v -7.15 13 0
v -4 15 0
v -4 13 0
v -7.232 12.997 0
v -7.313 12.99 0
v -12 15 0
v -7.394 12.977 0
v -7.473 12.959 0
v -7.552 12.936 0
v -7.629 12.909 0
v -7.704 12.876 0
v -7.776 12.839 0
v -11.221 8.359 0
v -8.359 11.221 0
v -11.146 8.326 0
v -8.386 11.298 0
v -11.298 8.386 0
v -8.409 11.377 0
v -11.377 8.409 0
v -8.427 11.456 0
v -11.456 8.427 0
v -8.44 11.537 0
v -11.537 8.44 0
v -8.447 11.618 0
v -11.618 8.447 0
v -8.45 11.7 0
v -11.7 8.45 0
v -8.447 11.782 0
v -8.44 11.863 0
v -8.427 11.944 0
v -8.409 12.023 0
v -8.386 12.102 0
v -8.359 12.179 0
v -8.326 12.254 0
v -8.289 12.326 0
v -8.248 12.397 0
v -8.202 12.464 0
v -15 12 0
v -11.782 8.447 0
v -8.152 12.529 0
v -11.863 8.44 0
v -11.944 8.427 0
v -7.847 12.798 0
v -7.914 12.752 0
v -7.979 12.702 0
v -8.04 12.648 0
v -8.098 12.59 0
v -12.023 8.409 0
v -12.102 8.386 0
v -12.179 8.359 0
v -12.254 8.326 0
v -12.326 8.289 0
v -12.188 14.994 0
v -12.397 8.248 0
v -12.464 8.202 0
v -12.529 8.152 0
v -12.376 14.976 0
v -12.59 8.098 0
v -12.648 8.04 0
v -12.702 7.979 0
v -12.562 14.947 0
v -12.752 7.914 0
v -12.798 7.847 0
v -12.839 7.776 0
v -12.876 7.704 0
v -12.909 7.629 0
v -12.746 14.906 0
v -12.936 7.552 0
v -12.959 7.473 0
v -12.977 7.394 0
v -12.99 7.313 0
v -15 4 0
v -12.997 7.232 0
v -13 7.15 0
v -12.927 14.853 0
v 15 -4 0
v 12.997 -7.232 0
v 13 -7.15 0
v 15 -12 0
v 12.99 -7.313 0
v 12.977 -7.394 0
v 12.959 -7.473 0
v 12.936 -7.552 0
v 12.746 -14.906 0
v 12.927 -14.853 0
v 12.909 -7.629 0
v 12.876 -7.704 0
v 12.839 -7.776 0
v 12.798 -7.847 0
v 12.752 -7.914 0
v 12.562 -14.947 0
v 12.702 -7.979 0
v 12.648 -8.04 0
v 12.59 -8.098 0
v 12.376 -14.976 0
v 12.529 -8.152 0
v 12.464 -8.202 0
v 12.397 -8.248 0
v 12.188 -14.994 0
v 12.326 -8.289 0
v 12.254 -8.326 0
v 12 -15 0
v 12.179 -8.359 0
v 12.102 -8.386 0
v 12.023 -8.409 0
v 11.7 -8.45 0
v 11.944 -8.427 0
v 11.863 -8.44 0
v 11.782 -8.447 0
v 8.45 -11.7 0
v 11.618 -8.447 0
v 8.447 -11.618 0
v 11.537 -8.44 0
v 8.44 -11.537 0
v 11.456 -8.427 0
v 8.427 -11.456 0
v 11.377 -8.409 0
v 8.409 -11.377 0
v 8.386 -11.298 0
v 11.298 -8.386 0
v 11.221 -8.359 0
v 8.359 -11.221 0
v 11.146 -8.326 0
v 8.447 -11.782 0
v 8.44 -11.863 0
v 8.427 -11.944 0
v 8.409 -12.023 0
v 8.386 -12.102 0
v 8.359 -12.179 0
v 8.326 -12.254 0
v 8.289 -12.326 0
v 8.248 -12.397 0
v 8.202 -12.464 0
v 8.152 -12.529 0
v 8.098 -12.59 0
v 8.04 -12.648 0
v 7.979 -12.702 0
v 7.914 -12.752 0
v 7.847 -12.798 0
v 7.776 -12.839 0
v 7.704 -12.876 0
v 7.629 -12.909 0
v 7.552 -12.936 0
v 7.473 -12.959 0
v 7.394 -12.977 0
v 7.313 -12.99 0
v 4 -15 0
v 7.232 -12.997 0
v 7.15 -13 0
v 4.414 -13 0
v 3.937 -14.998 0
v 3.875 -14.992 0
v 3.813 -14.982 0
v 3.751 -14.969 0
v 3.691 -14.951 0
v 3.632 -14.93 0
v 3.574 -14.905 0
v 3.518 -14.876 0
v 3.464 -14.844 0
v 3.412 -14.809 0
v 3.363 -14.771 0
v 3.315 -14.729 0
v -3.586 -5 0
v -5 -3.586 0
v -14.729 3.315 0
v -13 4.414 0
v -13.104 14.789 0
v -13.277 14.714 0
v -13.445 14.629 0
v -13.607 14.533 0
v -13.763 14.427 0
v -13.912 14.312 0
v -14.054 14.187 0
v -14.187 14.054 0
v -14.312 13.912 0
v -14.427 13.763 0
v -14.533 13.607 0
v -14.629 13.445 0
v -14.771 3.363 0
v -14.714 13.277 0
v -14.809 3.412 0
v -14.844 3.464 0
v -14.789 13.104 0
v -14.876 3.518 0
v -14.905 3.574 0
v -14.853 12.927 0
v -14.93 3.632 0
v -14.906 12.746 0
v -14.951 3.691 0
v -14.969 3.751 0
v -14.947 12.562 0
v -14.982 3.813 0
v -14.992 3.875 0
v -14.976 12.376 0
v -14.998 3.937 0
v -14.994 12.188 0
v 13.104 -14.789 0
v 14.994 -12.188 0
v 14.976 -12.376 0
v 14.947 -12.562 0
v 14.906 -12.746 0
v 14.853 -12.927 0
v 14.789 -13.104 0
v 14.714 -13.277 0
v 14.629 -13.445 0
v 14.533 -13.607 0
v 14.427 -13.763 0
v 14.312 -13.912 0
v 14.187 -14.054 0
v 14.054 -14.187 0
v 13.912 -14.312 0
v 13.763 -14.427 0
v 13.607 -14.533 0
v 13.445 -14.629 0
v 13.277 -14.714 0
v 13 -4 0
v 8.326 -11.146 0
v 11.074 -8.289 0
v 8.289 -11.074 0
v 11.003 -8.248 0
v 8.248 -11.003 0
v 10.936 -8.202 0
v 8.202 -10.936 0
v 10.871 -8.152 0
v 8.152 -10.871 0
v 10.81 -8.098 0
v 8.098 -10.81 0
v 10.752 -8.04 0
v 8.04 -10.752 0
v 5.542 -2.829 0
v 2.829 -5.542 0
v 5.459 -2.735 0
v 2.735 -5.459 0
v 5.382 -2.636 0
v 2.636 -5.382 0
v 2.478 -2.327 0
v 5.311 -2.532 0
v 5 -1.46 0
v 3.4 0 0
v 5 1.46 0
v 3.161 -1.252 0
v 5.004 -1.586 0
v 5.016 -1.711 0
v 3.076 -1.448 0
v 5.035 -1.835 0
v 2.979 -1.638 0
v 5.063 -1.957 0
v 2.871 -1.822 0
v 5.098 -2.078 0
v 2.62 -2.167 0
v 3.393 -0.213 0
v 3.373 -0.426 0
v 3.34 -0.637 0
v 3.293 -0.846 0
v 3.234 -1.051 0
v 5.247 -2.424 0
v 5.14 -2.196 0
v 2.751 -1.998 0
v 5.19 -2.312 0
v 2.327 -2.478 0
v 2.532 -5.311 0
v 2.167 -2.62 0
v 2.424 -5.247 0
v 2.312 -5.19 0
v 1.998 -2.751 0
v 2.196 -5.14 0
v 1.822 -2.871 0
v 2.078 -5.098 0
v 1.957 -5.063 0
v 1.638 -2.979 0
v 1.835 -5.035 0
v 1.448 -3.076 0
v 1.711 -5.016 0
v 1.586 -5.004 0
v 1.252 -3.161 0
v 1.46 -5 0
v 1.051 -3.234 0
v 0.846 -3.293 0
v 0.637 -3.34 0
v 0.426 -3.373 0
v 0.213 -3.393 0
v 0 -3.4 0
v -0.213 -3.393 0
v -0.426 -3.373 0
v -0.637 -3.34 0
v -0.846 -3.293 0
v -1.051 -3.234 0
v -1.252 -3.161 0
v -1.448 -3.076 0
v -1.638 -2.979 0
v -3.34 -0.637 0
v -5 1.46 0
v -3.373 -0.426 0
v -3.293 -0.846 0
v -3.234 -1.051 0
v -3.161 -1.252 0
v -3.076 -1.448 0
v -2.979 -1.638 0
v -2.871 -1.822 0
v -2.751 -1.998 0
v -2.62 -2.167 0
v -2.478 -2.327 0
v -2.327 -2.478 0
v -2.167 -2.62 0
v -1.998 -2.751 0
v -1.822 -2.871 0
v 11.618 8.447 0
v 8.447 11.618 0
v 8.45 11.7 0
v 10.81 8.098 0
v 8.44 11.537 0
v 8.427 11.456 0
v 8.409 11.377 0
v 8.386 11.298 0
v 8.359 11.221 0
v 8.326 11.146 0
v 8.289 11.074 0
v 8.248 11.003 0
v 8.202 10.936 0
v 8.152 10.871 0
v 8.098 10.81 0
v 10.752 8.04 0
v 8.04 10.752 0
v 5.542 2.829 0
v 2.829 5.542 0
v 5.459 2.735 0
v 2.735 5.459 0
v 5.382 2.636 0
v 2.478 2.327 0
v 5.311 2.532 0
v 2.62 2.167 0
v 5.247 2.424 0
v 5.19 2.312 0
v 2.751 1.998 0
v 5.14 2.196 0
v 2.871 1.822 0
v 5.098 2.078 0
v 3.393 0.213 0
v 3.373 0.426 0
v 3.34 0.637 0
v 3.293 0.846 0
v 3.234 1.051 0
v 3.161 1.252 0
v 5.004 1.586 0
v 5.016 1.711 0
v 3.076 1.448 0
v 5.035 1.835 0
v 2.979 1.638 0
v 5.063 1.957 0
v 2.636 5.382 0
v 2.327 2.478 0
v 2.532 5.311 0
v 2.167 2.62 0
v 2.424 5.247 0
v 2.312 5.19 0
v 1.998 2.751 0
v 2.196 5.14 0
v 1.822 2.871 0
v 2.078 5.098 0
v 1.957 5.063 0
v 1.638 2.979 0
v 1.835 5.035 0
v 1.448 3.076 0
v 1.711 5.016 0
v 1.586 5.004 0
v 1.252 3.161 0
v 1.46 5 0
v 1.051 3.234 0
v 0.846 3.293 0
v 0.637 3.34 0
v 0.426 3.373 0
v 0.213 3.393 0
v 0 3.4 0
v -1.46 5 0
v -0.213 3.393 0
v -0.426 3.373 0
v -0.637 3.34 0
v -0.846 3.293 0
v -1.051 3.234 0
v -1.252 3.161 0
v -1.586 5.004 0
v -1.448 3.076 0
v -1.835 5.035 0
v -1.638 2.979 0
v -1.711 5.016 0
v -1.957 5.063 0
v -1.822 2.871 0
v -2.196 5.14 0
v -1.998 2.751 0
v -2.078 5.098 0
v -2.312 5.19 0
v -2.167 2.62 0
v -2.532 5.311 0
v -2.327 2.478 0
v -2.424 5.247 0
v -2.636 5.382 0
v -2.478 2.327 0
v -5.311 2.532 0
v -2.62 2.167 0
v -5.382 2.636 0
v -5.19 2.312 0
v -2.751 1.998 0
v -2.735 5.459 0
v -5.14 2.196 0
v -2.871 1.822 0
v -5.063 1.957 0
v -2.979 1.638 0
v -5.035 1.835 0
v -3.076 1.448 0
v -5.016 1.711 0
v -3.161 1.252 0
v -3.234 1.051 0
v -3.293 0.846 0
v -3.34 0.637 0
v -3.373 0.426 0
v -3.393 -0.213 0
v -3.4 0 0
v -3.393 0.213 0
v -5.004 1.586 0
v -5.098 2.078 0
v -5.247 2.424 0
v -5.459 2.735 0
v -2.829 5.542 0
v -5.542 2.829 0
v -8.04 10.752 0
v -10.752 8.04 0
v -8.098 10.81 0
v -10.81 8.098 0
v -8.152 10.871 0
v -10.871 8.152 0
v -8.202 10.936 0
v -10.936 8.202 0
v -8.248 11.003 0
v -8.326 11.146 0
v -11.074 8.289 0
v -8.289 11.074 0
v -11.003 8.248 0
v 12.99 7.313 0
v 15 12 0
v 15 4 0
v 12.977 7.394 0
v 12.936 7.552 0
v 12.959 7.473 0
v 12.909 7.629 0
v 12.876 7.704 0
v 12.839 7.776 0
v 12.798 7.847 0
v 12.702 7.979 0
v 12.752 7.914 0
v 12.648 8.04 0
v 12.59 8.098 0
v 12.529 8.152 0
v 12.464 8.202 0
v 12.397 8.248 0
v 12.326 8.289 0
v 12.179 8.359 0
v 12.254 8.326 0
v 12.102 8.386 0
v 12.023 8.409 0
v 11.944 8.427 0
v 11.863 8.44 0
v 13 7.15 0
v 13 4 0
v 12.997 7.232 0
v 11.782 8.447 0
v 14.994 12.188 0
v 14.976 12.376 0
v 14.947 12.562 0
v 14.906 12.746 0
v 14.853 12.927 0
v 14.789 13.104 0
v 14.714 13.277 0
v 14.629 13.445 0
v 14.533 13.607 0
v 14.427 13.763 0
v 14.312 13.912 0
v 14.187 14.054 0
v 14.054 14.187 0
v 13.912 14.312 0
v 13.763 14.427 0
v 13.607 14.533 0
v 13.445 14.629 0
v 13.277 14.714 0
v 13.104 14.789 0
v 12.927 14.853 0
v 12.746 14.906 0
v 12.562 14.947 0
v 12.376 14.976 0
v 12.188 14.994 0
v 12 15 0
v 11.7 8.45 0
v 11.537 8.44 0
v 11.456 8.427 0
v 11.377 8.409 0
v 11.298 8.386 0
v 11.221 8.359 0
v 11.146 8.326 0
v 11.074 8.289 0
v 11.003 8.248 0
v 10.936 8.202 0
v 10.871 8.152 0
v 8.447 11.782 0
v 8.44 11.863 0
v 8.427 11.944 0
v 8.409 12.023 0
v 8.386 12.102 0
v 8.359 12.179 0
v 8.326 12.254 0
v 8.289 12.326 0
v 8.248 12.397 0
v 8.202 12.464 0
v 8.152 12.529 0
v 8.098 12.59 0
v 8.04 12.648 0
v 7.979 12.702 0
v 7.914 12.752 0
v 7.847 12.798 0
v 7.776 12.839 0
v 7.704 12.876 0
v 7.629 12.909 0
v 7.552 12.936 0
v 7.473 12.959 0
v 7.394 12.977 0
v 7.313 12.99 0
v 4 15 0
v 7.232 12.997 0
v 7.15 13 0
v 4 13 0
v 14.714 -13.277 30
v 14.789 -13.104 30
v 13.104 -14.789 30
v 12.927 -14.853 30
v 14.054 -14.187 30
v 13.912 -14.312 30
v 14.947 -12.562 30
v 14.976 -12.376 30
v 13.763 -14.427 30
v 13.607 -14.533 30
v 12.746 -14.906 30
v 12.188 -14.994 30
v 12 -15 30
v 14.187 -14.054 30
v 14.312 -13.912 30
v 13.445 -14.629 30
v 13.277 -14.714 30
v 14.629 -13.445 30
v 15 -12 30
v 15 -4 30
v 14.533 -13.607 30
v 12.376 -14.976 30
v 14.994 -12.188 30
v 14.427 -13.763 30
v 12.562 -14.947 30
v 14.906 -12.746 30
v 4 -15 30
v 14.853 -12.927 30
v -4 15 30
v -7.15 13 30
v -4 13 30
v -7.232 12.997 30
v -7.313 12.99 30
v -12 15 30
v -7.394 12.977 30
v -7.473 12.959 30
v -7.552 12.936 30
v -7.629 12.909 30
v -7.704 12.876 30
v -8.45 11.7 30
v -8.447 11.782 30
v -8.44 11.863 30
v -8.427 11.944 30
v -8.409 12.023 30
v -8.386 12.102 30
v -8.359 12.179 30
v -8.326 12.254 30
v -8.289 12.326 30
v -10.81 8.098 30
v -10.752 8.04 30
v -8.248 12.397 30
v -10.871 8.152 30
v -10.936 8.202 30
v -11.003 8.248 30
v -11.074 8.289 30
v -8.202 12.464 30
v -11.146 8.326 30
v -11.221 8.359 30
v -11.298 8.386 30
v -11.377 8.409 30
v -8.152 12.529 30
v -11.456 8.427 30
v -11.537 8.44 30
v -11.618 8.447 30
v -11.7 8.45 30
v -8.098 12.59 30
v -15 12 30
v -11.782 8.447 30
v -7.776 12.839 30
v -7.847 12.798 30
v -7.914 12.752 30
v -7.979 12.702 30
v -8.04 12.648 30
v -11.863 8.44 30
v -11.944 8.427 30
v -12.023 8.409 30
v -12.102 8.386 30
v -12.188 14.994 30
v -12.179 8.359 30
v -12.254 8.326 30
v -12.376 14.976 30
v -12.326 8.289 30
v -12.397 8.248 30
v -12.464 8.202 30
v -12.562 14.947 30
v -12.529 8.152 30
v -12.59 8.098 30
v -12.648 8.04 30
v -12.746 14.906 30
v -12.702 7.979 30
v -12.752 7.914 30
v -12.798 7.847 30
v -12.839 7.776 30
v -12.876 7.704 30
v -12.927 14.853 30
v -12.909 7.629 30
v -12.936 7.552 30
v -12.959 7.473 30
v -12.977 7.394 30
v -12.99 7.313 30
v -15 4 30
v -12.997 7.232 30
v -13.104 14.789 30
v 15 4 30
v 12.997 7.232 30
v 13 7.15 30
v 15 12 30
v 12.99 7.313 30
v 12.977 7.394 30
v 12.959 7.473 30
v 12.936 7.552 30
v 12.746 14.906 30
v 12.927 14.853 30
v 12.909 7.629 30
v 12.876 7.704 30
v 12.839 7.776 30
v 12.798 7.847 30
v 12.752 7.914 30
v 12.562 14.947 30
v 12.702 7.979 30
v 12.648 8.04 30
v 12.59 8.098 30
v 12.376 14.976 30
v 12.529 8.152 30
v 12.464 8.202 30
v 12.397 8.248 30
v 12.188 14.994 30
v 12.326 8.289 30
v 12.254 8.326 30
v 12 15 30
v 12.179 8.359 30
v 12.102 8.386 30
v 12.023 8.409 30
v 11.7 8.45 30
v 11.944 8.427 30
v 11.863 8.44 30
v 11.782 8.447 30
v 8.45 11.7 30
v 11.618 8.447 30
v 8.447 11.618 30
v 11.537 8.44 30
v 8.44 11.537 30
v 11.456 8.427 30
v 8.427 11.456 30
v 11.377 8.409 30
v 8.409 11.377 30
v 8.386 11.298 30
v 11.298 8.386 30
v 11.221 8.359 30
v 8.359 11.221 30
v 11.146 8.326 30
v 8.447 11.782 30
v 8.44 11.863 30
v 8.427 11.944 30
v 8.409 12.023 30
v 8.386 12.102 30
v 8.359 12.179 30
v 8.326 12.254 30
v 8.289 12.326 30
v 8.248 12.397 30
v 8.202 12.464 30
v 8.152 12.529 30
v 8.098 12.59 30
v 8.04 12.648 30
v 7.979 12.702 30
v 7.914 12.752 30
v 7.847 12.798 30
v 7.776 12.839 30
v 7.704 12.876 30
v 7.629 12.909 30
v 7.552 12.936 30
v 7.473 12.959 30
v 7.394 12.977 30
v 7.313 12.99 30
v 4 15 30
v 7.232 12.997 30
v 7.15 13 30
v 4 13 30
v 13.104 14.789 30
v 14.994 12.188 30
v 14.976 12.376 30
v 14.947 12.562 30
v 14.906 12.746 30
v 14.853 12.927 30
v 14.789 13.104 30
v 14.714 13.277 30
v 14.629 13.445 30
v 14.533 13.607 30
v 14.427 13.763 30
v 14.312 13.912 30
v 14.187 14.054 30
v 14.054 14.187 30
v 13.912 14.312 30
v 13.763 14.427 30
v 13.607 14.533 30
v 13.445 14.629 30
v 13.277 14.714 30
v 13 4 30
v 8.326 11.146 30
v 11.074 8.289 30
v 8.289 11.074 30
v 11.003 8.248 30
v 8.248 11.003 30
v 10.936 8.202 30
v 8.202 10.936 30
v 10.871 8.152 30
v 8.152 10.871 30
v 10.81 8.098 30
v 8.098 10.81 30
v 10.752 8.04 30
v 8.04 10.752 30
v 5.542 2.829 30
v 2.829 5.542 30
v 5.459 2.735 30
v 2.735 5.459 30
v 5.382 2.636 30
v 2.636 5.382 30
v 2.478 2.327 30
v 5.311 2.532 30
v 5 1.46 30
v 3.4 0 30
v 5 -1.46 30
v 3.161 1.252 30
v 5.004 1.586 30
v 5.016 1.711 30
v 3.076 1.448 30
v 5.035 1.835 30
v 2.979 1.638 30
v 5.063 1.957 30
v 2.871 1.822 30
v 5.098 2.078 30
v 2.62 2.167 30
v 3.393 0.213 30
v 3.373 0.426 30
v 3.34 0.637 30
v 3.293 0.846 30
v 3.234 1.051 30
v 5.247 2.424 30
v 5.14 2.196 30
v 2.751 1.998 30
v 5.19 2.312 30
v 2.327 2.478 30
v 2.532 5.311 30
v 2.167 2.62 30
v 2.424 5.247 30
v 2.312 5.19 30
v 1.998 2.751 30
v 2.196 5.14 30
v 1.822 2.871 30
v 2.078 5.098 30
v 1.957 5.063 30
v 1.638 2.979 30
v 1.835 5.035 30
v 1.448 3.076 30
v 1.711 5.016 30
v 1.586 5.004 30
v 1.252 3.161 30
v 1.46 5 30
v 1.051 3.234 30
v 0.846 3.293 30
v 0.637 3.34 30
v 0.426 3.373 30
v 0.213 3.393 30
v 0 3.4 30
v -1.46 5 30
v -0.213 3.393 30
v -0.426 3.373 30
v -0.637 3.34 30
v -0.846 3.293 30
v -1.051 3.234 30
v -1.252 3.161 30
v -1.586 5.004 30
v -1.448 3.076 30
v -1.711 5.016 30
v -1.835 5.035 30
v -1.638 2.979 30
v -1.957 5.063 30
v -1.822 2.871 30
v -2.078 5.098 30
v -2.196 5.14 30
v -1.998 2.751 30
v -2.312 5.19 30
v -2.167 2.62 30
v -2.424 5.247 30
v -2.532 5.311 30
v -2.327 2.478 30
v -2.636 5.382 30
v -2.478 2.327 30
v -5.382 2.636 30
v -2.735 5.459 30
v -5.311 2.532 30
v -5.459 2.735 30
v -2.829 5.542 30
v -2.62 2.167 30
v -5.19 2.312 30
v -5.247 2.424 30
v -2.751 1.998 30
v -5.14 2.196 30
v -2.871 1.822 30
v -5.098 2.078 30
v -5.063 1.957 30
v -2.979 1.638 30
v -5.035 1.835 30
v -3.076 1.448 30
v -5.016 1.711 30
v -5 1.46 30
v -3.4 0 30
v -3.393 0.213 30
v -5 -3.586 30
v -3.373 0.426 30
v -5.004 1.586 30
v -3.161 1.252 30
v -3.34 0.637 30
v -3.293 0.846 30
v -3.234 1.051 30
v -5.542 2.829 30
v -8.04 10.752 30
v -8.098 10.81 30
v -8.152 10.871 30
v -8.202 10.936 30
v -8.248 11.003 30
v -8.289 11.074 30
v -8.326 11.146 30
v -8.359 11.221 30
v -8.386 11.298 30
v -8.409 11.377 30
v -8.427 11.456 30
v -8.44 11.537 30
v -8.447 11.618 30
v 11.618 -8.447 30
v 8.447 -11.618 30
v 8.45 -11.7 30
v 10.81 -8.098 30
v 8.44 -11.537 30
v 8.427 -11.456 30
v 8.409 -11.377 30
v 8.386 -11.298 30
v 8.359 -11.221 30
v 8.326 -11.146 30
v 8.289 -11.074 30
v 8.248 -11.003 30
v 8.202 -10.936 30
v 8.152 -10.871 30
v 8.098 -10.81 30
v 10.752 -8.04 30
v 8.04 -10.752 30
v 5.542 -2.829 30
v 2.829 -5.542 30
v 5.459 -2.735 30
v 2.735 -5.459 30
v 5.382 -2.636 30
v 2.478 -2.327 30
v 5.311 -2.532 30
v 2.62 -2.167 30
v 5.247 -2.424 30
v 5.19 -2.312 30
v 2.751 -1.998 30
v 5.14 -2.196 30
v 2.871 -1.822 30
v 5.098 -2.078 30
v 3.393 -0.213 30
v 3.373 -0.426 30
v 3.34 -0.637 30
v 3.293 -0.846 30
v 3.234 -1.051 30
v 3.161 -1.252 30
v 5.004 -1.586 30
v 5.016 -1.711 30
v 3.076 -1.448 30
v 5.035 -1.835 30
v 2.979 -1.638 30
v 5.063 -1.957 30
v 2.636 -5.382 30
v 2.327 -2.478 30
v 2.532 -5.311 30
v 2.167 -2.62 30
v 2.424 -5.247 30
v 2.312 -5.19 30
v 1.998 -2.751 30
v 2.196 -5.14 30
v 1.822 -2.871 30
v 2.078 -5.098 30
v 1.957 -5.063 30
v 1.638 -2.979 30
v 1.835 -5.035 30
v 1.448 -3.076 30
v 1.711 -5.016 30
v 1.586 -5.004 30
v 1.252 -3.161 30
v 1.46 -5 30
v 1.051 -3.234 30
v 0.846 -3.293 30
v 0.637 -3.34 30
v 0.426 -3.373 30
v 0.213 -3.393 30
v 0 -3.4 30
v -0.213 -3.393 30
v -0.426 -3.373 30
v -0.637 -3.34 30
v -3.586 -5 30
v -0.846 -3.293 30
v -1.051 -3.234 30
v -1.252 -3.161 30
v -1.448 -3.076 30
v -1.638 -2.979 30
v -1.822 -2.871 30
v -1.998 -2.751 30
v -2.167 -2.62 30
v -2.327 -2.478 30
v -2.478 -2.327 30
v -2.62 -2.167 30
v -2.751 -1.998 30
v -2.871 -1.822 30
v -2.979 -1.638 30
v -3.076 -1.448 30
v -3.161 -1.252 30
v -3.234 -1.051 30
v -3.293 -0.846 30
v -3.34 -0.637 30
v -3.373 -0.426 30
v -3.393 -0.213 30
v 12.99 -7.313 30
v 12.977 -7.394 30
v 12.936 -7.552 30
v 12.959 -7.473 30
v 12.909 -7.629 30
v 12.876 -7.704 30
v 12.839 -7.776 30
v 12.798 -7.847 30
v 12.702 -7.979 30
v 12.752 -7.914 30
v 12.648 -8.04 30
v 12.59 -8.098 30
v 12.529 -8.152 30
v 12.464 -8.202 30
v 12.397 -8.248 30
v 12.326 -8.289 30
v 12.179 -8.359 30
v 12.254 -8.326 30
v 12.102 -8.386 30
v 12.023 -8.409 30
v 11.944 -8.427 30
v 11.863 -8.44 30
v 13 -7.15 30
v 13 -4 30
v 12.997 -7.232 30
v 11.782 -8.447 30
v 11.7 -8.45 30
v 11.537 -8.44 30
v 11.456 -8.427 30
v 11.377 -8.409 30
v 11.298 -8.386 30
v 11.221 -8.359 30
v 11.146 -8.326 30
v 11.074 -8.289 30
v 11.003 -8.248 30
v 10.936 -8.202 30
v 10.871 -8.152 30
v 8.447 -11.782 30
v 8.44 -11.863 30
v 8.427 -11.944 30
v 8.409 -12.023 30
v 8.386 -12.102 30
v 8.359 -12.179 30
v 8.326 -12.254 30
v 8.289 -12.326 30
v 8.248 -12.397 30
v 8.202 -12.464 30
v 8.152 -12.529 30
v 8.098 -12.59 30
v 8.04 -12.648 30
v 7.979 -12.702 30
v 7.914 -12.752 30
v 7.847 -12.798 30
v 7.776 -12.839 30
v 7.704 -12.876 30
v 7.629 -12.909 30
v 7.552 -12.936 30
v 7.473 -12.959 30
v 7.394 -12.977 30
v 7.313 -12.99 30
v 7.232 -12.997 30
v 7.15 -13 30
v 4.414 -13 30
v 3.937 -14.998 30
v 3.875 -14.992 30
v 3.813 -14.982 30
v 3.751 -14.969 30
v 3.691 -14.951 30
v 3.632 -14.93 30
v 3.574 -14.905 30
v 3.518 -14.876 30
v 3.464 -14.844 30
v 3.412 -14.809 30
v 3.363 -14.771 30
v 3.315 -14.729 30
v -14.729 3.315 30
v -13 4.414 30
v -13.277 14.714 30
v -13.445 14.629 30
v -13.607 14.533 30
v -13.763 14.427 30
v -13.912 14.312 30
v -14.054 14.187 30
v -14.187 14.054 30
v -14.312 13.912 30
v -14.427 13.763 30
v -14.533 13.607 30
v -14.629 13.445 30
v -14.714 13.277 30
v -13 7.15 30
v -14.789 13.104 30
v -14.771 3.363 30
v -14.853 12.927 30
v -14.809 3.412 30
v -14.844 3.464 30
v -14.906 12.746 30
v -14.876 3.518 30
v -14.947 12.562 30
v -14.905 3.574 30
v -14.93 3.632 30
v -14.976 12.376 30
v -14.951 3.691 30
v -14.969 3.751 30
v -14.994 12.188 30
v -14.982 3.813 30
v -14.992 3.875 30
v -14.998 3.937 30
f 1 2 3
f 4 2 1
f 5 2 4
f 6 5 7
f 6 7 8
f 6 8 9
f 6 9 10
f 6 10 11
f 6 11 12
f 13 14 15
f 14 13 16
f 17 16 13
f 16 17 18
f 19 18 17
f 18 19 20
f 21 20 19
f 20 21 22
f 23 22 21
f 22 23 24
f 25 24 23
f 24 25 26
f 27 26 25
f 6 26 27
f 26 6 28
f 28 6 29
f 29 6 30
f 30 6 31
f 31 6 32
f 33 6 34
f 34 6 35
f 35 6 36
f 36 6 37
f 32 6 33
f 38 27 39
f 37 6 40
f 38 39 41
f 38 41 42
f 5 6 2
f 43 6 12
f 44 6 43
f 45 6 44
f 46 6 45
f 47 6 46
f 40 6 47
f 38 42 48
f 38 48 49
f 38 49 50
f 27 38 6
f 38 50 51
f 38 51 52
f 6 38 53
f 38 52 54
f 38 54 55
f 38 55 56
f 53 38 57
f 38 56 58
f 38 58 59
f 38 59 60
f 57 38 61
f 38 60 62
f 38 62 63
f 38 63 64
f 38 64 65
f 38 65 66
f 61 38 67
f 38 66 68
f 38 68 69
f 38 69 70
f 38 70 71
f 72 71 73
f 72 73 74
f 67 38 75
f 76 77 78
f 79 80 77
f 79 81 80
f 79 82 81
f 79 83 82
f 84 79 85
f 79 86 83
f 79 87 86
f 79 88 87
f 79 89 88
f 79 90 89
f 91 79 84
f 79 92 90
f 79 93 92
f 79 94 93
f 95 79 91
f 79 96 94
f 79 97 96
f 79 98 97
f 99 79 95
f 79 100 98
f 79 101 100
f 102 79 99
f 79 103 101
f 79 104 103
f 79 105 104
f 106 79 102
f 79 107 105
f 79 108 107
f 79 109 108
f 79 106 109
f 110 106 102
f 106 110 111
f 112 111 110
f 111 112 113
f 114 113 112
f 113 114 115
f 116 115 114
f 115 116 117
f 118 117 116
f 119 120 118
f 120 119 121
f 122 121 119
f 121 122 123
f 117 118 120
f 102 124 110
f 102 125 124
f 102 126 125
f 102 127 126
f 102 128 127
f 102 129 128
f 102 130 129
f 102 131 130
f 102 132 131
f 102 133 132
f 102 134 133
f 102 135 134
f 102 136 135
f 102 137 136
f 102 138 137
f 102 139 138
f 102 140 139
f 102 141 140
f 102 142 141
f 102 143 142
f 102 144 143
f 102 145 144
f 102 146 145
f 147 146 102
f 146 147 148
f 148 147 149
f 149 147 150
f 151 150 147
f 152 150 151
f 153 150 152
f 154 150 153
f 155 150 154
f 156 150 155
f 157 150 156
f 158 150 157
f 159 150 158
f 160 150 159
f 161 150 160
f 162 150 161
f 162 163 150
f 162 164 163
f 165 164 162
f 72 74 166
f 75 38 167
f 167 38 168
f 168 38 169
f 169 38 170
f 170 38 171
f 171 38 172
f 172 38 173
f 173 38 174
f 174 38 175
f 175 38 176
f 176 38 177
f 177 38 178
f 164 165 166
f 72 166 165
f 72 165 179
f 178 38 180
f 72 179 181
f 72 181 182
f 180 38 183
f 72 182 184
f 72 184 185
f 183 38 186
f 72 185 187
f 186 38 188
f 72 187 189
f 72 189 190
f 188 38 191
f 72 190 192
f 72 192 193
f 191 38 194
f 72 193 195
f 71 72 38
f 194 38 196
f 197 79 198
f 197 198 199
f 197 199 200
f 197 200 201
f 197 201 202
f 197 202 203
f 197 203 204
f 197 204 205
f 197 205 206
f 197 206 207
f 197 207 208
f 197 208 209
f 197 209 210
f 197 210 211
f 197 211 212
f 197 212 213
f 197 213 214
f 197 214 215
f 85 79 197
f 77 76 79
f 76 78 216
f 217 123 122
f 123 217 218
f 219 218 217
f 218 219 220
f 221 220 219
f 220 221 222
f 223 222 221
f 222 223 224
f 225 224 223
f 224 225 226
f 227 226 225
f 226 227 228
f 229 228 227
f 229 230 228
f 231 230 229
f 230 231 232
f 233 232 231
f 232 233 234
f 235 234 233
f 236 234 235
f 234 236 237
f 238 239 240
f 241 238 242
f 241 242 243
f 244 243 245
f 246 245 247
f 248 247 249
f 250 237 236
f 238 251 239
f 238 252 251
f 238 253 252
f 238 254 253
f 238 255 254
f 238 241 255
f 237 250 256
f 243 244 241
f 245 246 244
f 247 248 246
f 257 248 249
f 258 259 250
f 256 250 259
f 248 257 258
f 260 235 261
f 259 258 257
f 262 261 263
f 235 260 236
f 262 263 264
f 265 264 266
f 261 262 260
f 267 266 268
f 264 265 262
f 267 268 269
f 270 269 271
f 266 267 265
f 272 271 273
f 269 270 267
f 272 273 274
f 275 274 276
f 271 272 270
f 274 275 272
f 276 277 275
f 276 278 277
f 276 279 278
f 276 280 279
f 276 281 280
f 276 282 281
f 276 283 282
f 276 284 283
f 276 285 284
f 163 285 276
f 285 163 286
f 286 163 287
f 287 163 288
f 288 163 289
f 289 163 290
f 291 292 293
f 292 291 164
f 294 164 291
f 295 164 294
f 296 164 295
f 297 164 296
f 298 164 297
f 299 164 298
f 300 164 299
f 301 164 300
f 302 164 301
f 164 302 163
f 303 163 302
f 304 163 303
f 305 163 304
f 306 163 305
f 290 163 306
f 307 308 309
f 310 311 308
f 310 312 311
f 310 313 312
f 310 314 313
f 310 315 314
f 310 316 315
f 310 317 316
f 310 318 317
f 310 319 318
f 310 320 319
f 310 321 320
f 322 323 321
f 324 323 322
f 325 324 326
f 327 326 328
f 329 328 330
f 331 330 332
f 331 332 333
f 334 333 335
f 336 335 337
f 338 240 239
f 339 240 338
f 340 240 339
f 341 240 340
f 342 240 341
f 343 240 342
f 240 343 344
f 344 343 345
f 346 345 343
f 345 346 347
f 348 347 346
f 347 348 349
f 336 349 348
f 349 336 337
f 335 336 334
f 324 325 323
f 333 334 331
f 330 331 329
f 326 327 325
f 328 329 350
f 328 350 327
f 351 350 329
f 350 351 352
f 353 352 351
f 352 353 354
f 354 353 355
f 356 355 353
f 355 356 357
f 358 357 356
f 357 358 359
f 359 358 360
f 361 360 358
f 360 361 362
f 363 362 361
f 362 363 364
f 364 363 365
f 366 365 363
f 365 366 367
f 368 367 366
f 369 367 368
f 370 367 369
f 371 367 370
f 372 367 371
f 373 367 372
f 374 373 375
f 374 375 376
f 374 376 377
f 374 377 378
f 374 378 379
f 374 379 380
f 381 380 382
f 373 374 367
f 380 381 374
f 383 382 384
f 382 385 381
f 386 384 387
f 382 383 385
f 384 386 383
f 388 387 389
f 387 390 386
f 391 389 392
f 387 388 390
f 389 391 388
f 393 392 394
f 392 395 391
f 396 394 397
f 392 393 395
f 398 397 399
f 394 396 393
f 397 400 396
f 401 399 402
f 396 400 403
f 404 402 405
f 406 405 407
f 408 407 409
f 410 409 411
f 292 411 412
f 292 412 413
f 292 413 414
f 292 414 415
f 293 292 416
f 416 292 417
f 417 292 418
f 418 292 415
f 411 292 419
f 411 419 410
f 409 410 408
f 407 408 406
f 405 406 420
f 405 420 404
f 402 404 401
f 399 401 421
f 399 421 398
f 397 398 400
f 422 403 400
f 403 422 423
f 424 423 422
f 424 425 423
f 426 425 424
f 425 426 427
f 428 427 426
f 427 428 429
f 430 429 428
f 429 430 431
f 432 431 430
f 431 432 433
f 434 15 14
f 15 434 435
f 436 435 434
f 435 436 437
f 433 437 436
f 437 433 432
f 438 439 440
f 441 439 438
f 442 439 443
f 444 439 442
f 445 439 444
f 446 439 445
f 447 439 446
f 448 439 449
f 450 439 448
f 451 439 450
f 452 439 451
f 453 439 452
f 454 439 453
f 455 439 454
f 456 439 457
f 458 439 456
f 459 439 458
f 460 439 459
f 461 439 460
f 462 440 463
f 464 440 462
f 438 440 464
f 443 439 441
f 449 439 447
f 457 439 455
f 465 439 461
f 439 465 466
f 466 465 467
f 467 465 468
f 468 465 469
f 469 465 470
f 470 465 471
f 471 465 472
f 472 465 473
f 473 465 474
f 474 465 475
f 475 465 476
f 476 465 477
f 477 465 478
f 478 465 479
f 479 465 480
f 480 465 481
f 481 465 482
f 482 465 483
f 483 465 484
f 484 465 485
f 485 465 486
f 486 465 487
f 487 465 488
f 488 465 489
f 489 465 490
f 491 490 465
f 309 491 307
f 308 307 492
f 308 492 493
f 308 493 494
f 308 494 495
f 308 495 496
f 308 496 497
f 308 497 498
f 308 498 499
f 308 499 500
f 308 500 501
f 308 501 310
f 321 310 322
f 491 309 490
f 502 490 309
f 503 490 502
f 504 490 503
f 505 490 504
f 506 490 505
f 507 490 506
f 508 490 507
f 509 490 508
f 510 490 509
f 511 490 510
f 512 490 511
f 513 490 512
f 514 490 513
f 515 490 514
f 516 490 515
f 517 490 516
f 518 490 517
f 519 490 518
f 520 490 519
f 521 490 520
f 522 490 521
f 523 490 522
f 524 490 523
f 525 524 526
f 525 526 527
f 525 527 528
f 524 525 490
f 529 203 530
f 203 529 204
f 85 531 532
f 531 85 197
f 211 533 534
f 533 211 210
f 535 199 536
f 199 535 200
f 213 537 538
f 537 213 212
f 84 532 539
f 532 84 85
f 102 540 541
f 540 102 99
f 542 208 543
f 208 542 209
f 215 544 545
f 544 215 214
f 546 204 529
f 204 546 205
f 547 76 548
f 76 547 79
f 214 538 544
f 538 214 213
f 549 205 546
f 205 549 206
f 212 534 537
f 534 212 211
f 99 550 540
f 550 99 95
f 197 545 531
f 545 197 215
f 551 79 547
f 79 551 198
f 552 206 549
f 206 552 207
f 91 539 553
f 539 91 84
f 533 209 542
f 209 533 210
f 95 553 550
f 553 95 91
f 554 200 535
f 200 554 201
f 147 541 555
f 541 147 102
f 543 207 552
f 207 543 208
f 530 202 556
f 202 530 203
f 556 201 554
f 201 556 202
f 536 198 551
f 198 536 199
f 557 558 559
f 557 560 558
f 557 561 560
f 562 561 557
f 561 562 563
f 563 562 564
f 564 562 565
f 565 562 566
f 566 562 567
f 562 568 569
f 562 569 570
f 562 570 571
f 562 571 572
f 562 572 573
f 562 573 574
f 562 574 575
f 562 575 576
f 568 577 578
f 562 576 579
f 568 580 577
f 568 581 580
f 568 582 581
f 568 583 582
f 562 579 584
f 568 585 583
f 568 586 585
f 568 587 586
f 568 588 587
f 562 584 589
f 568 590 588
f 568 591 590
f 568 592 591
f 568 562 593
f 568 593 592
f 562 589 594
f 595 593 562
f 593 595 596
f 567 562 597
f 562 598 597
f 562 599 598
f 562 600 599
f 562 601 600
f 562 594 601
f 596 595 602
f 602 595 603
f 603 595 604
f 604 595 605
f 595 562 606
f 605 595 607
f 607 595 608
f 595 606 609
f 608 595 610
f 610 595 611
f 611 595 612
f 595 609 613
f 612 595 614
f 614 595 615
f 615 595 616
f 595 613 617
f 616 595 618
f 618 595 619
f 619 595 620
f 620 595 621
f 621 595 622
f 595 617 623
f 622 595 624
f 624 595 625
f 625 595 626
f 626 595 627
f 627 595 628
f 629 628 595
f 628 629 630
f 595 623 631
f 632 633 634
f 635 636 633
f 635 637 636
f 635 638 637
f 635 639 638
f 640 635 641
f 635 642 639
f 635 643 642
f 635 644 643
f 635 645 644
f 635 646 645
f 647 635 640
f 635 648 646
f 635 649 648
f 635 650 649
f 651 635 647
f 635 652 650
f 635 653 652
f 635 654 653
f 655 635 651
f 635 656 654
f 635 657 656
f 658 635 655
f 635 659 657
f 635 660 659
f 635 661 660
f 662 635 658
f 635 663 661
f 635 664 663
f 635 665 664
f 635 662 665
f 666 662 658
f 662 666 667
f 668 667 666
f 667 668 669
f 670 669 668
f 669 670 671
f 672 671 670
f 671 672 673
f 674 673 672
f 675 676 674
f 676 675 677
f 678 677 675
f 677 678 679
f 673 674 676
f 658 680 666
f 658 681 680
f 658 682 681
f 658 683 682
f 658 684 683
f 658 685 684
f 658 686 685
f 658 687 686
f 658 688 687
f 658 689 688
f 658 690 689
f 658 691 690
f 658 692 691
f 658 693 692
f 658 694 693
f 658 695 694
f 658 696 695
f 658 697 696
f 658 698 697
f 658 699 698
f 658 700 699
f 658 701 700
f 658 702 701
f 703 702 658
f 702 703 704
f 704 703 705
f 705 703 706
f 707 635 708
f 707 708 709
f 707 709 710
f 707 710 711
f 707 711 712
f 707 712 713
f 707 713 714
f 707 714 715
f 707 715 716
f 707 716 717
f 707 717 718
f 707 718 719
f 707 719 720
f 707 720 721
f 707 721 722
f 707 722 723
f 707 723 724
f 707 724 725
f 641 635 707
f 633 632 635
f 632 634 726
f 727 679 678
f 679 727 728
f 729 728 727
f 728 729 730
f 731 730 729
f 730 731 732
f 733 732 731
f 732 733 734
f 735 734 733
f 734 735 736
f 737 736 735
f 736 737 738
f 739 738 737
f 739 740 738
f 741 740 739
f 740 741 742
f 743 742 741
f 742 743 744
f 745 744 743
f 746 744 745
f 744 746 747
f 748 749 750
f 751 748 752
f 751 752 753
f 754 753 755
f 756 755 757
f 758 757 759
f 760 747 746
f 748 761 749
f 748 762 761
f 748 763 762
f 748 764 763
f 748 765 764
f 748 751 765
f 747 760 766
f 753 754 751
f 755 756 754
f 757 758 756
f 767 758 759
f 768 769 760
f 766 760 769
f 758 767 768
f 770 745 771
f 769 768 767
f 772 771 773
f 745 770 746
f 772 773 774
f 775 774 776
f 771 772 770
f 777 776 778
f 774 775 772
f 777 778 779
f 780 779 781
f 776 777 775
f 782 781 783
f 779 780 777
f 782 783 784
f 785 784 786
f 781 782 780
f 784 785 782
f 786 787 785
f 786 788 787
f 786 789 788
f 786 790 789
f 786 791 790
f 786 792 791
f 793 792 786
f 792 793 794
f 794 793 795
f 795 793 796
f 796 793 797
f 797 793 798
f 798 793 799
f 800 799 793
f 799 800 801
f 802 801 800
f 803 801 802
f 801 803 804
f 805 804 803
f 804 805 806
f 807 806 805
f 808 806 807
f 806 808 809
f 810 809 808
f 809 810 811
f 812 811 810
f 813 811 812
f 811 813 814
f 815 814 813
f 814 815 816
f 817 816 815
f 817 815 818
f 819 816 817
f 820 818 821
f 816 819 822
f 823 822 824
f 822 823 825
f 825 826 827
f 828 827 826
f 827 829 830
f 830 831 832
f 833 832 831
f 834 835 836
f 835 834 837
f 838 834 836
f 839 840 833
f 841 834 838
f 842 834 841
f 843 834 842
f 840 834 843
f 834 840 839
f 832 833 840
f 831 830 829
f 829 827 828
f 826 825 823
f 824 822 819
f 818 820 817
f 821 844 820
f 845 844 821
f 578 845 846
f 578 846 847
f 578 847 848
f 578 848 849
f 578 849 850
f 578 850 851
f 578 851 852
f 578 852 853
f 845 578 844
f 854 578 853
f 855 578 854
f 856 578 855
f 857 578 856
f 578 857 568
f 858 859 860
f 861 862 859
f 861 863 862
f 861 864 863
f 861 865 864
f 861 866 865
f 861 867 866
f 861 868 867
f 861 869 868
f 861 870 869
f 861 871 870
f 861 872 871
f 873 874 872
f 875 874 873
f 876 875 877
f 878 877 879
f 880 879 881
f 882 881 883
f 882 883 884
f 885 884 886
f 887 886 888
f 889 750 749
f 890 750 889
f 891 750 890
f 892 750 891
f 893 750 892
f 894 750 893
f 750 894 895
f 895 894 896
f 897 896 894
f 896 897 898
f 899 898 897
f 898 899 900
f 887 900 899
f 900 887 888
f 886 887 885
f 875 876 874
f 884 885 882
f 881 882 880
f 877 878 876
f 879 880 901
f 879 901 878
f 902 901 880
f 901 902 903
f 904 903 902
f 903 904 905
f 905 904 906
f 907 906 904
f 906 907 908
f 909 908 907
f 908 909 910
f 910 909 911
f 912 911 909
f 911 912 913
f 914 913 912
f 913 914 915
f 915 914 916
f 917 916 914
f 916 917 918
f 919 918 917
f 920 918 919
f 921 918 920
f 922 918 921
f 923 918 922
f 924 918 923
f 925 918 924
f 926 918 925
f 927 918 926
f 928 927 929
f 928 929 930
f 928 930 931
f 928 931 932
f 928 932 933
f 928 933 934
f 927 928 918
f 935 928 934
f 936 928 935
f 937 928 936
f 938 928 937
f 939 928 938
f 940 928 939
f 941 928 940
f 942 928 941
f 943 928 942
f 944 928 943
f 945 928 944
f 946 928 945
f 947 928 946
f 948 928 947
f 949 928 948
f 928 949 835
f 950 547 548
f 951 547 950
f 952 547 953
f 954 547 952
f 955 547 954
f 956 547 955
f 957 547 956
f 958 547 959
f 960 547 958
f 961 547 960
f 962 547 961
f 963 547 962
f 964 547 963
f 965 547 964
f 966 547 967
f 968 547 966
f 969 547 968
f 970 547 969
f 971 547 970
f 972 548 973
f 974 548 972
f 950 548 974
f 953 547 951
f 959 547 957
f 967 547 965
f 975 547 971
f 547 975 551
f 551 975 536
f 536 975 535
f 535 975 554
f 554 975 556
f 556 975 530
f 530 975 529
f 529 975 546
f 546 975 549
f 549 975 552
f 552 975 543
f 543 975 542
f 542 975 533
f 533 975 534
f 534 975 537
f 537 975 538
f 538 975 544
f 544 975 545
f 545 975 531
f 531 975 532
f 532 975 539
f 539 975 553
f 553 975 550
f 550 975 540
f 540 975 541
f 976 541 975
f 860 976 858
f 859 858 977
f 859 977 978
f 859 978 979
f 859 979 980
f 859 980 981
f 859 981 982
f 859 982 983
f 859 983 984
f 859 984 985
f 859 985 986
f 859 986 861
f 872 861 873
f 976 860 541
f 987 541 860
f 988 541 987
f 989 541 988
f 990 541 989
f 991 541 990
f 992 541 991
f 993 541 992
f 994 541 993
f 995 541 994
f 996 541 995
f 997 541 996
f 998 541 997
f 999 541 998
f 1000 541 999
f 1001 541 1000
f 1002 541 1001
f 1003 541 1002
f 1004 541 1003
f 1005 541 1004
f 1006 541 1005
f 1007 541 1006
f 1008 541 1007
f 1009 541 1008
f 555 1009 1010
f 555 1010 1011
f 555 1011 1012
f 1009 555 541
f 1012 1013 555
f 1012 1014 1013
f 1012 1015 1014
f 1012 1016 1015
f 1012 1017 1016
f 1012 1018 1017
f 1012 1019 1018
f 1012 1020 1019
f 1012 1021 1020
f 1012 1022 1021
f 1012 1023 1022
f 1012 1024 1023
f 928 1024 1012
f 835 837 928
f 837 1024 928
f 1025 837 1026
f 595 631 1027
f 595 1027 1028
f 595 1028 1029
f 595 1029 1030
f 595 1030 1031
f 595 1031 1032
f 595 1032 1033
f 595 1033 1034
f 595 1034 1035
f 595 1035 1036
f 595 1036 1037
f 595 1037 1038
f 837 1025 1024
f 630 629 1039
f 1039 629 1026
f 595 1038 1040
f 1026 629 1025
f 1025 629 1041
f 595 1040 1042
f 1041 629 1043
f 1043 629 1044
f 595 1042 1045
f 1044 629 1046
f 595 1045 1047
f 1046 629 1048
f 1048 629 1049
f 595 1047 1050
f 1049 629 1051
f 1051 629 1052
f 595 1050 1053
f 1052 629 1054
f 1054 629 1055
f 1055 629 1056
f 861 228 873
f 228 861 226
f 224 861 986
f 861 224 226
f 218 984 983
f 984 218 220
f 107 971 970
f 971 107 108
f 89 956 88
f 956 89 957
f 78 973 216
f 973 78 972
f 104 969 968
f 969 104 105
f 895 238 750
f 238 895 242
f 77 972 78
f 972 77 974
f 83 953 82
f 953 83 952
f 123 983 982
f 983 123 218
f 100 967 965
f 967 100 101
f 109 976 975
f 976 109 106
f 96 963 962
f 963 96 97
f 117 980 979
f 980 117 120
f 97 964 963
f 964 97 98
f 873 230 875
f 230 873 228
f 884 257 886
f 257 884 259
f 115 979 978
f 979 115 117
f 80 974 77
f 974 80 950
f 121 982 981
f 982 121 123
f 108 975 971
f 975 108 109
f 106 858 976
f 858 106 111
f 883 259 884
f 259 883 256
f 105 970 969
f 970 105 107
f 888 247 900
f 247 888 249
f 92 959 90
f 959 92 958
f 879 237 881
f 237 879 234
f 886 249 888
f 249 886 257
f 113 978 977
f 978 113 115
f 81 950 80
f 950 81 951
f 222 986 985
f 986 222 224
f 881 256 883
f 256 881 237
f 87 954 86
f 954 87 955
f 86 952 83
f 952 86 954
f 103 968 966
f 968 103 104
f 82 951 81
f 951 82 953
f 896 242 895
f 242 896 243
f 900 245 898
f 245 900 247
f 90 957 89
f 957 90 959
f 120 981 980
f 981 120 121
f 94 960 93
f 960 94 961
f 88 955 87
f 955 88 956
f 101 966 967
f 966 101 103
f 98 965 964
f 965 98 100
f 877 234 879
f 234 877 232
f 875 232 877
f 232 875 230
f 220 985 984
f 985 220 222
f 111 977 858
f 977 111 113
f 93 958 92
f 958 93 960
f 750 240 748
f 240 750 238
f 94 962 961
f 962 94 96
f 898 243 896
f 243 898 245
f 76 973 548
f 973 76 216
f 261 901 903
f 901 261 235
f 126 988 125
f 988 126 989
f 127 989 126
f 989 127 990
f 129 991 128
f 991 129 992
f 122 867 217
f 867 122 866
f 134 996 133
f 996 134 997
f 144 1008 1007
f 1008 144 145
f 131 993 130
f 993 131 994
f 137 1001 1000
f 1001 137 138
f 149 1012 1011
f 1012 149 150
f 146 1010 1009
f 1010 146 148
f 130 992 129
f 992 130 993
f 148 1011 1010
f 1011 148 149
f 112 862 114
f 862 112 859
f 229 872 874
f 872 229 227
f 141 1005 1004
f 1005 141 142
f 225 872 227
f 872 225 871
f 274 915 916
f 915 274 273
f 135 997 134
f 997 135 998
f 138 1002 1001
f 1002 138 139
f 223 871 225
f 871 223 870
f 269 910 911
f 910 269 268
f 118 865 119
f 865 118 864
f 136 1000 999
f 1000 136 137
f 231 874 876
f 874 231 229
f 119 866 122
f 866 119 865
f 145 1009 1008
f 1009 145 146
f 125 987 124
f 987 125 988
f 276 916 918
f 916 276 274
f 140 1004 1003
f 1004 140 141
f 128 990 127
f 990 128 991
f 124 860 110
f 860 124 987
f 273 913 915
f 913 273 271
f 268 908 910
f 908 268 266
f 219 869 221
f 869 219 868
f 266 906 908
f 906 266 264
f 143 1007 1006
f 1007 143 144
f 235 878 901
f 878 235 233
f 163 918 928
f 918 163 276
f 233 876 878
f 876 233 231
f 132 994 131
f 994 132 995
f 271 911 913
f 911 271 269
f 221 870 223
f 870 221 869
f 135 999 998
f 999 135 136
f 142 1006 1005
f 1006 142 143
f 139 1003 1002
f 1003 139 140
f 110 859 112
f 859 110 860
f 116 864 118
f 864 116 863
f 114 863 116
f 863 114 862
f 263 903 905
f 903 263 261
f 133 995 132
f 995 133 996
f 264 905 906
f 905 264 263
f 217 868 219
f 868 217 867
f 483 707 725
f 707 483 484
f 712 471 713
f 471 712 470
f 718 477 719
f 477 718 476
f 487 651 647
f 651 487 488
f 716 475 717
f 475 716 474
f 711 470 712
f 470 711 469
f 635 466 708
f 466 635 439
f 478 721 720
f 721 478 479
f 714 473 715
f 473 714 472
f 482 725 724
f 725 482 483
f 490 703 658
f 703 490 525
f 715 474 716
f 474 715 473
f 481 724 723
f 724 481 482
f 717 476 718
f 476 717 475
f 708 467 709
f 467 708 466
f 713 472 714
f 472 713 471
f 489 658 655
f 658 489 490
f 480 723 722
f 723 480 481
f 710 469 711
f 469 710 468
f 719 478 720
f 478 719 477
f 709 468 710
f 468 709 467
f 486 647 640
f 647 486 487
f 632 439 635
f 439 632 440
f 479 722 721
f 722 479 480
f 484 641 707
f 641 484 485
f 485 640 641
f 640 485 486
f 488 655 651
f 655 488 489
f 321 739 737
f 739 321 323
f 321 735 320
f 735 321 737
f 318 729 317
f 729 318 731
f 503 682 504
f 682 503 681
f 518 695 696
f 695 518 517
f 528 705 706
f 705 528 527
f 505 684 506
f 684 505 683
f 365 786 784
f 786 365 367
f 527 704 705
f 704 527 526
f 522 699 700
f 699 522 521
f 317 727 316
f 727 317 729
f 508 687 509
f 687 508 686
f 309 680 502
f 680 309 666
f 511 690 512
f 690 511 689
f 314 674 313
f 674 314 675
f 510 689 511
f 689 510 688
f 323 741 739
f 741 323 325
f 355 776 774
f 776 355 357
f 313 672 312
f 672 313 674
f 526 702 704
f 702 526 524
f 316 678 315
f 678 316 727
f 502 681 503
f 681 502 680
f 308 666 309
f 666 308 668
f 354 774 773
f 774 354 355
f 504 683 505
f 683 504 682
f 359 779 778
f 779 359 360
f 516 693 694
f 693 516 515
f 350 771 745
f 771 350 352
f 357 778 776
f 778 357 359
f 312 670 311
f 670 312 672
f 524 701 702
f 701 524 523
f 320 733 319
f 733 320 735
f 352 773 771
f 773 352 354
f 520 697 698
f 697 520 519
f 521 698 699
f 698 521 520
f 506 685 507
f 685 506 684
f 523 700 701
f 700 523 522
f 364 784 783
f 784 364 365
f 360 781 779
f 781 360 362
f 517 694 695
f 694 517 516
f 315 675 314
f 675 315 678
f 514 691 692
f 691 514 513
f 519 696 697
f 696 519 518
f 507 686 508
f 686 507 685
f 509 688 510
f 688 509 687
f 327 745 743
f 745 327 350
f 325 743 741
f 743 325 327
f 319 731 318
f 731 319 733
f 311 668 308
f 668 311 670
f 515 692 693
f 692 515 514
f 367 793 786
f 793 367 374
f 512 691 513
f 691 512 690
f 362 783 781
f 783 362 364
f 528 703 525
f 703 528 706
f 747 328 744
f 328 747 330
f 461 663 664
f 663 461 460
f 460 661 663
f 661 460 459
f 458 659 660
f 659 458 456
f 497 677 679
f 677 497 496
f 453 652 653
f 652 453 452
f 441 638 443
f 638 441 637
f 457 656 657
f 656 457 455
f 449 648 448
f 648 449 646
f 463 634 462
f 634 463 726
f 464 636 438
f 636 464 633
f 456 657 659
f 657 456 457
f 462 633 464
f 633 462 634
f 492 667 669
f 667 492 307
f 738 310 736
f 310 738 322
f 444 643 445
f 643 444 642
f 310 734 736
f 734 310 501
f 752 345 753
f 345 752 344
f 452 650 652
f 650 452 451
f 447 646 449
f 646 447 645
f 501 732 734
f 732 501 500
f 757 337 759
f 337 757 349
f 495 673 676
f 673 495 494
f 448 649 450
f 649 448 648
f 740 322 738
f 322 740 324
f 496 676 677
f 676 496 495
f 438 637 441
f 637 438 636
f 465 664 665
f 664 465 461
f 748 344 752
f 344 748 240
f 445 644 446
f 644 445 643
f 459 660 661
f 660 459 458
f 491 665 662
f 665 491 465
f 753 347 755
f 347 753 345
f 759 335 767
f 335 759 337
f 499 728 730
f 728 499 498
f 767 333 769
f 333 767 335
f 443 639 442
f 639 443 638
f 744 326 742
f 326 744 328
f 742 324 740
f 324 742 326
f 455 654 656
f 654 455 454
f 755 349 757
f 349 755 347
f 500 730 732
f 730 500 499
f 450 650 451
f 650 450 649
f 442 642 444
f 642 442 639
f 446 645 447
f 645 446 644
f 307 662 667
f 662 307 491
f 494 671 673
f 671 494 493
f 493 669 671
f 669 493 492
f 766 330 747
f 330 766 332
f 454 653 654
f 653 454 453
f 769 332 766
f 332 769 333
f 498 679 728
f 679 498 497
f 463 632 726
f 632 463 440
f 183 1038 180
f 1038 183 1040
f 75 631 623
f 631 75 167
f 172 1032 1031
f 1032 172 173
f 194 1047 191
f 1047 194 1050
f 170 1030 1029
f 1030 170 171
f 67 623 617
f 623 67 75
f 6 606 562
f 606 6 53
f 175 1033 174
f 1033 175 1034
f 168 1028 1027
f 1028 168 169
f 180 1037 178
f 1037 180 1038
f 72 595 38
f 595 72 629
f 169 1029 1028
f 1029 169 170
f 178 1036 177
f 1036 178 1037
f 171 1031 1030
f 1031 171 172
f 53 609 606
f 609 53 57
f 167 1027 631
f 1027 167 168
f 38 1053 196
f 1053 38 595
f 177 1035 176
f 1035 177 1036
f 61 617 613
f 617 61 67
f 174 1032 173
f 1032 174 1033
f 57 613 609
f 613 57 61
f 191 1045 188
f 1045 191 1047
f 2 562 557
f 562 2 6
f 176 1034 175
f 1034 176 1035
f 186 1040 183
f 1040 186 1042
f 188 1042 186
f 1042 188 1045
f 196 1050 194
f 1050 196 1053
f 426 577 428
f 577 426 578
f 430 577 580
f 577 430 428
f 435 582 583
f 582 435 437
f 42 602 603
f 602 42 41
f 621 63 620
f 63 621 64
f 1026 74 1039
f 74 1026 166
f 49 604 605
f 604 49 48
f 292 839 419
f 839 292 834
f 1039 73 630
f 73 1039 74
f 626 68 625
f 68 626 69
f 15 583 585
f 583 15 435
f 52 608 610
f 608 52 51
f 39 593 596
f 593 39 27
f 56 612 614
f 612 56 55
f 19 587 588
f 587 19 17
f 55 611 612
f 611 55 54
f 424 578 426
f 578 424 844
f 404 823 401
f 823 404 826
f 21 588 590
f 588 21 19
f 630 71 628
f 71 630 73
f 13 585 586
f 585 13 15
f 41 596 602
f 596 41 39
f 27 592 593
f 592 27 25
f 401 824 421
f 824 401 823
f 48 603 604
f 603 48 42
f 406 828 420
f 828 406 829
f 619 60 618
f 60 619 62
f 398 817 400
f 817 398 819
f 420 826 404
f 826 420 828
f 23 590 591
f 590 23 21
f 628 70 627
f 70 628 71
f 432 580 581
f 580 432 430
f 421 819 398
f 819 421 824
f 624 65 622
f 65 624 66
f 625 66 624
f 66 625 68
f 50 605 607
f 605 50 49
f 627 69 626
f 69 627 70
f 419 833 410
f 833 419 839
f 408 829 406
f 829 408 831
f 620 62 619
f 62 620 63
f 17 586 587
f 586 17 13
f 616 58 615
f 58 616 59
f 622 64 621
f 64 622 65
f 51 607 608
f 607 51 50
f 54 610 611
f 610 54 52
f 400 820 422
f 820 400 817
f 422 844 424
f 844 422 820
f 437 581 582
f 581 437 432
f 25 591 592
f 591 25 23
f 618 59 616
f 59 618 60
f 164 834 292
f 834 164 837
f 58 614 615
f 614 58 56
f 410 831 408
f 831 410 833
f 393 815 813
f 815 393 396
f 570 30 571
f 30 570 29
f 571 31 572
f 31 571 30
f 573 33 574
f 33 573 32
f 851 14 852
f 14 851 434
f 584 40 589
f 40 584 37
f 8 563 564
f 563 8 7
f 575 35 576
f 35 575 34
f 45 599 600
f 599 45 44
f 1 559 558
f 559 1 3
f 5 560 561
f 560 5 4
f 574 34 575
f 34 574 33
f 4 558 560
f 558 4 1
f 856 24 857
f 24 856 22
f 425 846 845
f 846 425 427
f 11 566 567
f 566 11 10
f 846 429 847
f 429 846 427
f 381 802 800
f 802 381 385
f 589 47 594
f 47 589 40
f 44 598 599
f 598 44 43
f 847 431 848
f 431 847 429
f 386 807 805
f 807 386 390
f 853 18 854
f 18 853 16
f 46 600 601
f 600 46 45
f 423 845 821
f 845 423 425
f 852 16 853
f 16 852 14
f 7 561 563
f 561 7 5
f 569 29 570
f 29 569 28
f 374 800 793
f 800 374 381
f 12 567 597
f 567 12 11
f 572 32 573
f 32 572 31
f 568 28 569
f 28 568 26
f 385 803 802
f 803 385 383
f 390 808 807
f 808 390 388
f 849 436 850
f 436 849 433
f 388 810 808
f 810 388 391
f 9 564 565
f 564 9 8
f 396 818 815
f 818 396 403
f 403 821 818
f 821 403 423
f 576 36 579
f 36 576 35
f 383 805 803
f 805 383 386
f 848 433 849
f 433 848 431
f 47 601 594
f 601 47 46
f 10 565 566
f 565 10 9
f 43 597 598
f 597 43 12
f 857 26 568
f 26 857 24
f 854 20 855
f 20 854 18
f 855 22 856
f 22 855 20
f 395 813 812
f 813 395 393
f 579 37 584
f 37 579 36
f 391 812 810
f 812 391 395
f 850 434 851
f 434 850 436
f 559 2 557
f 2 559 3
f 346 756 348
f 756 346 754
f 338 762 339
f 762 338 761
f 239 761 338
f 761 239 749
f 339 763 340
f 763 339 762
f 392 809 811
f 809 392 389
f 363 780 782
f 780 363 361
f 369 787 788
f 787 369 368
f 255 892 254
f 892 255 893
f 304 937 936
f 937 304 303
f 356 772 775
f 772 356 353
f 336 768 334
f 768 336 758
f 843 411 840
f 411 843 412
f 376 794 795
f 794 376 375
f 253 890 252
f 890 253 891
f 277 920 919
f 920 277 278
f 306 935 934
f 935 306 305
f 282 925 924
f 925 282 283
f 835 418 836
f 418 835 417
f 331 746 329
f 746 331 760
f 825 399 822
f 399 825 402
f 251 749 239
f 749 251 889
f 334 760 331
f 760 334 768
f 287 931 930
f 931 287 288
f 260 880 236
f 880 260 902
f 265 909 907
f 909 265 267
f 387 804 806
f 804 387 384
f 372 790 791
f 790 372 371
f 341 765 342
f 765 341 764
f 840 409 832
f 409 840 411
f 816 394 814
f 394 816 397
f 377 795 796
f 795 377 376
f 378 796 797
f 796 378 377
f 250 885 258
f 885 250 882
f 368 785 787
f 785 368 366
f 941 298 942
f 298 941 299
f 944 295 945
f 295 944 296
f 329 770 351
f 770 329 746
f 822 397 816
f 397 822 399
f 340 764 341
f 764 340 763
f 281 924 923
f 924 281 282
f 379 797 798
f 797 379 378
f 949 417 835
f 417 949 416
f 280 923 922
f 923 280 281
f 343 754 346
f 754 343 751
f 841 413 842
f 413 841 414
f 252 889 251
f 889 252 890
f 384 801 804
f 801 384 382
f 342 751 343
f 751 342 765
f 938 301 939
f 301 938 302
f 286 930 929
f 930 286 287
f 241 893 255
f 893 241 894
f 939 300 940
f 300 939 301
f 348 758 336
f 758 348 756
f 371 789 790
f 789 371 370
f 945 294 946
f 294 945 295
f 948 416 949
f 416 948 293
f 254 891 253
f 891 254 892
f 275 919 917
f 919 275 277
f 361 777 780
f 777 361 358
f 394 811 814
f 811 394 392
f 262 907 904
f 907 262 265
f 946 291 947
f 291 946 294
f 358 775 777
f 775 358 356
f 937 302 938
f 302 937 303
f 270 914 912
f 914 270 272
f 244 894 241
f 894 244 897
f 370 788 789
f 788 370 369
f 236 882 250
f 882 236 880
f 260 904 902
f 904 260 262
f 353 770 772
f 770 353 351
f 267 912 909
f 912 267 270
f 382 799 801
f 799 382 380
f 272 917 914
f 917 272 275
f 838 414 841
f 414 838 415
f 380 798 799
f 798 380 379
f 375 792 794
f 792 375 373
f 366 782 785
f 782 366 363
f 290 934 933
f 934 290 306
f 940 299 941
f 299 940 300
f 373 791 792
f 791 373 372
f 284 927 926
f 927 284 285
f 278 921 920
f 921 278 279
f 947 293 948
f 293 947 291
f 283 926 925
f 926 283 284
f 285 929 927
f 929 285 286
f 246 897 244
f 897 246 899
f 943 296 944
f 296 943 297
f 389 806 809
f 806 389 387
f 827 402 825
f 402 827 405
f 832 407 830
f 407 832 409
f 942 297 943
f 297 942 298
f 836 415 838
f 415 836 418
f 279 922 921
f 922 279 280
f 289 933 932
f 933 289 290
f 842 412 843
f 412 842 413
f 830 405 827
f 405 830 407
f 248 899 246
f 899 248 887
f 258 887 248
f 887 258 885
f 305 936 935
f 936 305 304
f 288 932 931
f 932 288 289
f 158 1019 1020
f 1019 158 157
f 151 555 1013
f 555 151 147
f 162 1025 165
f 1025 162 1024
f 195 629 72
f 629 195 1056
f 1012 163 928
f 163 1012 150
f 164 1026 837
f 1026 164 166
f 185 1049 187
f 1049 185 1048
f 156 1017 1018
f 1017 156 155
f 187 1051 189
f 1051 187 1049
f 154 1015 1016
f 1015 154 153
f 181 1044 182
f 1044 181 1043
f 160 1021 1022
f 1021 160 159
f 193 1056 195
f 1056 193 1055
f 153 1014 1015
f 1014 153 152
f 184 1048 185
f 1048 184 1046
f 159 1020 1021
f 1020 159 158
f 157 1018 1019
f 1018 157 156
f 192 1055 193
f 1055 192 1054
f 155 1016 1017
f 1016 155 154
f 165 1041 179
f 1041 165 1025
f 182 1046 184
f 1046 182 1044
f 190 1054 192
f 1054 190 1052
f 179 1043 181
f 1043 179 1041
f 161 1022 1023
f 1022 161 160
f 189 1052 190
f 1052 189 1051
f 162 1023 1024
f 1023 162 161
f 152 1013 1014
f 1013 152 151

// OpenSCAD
// variables
height = 30; // [1:400]
size = 8; // [4,6,8]
// calculations
s = size/8;
// model
scale([s,s,1]) union(){
for (z = [1, 2, 3]) 
{
	rotate([0,0,90*z]) translate([-15,-15,0]) difference(){
		hull(){
			translate([3,3,0]) cylinder(h=height,r=3,$fn=100);
			translate([9,0,0]) cube([6,6,height]);
			translate([9,9,0]) cube([6,6,height]);
			translate([0,9,0]) cube([6,6,height]);
		}
		hull(){
			translate([7.85,3.3,0]) cylinder(h=height,r=1.3,$fn=100);
			translate([14,2,0]) cube([1,1,height]);
			translate([13.54,8,0]) cylinder(h=height,r=2,$fn=100);
			translate([14,9,0]) cube([1,1,height]);
		}
		hull(){
			translate([11,0,0]) cube([2,2,height]);
			translate([13,0,0]) cube([2,2,height]);
		}
		mirror([5,-5,0]) hull(){
			translate([7.85,3.3,0]) cylinder(h=height,r=1.3,$fn=100);
			translate([14,2,0]) cube([1,1,height]);
			translate([13.54,8,0]) cylinder(h=height,r=2,$fn=100);
			translate([14,9,0]) cube([1,1,height]);
		}
		mirror([5,-5,0]) hull(){
			translate([11,-0.5,0]) cube([3,3,height]);
			translate([13,-0.5,0]) cube([3,3,height]);
		}
		translate([15,15,0]) cylinder(h=height,r=3.4,$fn=100);
	}
}
	difference(){
		translate([-5,-5,0]) cube([10,10,height]);
		translate([0,0,0]) cylinder(h=height,r=3.4,$fn=100);
	}
	hull(){
		translate([-14,4,0]) cylinder(h=height,r=1,$fn=100);
		translate([4,-14,0]) cylinder(h=height,r=1,$fn=100);
	}
}
